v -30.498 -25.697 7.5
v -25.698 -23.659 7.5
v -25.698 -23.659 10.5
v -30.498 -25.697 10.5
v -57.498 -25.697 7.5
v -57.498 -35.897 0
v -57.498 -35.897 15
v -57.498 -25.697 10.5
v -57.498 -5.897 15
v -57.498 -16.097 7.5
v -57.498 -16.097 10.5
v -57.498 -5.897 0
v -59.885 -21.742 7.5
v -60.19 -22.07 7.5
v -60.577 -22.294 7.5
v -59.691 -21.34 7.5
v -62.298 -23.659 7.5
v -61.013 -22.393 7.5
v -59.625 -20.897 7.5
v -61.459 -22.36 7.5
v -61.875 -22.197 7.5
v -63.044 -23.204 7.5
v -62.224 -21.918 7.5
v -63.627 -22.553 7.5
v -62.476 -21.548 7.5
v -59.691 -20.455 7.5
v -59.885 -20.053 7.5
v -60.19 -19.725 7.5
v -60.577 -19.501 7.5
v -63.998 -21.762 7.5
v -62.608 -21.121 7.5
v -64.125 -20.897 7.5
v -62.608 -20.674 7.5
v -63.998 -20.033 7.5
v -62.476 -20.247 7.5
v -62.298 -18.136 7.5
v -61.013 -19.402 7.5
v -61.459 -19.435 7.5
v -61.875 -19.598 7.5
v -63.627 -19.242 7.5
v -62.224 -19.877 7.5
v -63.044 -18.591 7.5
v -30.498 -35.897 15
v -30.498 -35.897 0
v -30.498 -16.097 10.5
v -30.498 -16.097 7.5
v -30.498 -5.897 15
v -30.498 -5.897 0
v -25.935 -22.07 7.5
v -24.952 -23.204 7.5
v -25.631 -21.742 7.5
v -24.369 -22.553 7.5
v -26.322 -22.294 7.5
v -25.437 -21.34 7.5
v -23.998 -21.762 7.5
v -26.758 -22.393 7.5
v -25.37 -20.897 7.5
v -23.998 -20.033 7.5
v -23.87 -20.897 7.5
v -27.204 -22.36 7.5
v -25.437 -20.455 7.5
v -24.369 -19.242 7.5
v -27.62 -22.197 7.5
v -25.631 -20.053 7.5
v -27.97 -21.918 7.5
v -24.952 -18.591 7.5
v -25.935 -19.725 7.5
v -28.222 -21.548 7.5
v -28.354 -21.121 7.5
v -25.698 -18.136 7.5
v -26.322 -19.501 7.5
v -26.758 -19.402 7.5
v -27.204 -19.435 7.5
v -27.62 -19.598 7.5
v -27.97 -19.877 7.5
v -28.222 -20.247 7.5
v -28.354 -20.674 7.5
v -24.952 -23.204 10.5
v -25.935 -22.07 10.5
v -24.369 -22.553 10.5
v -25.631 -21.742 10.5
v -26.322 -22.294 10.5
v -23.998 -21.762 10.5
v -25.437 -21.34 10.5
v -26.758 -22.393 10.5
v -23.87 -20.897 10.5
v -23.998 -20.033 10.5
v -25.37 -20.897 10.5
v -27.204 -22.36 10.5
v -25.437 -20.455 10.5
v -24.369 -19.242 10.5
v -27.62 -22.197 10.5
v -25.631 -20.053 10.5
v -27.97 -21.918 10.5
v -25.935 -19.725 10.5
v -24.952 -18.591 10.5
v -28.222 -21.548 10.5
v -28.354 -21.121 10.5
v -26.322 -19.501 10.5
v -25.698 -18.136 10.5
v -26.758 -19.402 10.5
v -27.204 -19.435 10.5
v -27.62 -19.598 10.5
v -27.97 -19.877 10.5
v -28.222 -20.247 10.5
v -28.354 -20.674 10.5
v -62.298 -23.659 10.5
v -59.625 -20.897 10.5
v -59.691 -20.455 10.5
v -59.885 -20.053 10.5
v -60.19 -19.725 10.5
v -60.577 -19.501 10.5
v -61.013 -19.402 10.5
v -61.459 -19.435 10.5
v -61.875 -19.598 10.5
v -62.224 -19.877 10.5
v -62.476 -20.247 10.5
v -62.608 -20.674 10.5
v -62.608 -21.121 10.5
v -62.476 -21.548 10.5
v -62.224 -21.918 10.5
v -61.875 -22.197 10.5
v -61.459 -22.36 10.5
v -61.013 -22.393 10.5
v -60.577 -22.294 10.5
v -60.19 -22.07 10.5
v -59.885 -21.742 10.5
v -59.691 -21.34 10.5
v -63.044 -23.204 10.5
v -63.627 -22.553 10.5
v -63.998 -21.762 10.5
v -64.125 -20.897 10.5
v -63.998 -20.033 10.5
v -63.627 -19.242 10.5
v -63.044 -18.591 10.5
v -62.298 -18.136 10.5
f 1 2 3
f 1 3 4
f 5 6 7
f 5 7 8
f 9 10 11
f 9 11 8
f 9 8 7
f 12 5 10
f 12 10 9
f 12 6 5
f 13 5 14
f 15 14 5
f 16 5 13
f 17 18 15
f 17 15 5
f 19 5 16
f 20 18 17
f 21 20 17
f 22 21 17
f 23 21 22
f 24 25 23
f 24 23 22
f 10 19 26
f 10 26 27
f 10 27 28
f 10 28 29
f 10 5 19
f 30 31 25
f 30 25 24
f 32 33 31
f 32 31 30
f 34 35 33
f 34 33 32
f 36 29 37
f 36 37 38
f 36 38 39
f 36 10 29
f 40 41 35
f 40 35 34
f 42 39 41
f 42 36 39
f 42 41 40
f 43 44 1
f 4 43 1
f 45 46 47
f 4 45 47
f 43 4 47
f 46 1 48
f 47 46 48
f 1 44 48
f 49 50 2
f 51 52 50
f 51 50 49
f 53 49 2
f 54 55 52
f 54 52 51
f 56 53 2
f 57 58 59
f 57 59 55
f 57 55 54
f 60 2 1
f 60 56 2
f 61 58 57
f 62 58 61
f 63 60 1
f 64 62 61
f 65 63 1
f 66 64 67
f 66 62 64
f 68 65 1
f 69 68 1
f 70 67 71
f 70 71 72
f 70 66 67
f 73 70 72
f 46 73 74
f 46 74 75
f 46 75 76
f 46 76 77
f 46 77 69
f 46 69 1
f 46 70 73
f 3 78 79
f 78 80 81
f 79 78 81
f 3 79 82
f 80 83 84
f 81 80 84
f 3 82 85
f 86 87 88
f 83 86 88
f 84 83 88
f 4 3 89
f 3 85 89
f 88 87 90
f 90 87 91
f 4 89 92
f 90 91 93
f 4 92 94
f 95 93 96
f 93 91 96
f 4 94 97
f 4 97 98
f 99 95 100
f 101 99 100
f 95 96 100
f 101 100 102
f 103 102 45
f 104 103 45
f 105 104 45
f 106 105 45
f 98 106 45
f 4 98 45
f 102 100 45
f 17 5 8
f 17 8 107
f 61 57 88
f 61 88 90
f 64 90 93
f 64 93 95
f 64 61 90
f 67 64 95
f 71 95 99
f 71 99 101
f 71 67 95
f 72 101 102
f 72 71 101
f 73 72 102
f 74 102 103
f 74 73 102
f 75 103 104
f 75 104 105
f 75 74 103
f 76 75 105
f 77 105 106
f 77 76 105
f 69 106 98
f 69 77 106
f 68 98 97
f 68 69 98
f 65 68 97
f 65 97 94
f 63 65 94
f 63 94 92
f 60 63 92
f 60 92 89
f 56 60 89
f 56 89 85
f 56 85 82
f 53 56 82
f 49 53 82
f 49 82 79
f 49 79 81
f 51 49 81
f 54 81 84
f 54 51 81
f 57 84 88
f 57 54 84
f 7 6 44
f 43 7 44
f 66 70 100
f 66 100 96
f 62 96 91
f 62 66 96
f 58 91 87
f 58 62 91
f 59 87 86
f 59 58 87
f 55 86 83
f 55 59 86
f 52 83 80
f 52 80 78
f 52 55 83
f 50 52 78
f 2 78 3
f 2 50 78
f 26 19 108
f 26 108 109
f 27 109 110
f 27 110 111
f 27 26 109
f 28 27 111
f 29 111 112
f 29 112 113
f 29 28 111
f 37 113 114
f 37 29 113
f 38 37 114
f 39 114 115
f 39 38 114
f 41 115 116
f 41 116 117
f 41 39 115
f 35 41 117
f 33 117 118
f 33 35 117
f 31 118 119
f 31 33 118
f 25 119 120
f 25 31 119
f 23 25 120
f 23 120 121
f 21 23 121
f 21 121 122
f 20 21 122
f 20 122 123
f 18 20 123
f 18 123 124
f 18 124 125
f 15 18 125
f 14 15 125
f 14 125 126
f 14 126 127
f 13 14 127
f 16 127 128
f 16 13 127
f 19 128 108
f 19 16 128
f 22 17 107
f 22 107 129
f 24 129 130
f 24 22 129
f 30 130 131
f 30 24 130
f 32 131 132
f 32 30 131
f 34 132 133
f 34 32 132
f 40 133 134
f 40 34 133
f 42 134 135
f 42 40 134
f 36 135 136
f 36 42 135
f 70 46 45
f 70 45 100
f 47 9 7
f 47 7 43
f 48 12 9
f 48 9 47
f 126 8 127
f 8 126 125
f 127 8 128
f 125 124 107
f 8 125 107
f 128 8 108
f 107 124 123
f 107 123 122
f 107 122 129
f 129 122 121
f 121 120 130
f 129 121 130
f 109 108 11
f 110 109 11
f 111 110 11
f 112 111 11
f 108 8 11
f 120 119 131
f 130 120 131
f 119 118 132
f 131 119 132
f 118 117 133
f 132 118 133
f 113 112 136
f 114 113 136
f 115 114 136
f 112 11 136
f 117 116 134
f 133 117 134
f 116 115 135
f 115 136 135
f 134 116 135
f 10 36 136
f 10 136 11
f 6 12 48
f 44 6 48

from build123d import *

# Parameters (mm, degrees)
SKETCH1_W           = 27
SKETCH1_H           = 30
BOSS_EXTRUDE3_DEPTH = 15
SKETCH5_R           = 1.5
BOSS_EXTRUDE7_DEPTH = 3


with BuildPart() as part:
    # Sketch1 → Boss-Extrude3 (new body)
    with BuildSketch(Plane.XY):
        with Locations((-43.997662922, -20.897486093)):
            Rectangle(SKETCH1_W, SKETCH1_H)
    extrude(amount=BOSS_EXTRUDE3_DEPTH)

    # Sketch5 → Boss-Extrude7 (add)
    with BuildSketch(Plane.XY.offset(7.5)):
        with BuildLine():
            Line((-30.497662922, -16.097486093), (-25.697662922, -18.13623415))
            ThreePointArc((-25.697662922, -18.13623415), (-23.870474804, -20.897486093), (-25.697662922, -23.658738035))
            Line((-25.697662922, -23.658738035), (-30.497662922, -25.697486093))
            Line((-30.497662922, -25.697486093), (-30.497662922, -16.097486093))
        make_face()
        with Locations((-26.870474804, -20.897486093)):
            Circle(SKETCH5_R, mode=Mode.SUBTRACT)
        with BuildLine():
            Line((-57.497662922, -16.097486093), (-57.497662922, -25.697486093))
            Line((-57.497662922, -25.697486093), (-62.297662922, -23.658738035))
            ThreePointArc((-62.297662922, -23.658738035), (-64.12485104, -20.897486093), (-62.297662922, -18.13623415))
            Line((-62.297662922, -18.13623415), (-57.497662922, -16.097486093))
        make_face()
        with Locations((-61.12485104, -20.897486093)):
            Circle(SKETCH5_R, mode=Mode.SUBTRACT)
    extrude(amount=BOSS_EXTRUDE7_DEPTH)


solid = part.part
